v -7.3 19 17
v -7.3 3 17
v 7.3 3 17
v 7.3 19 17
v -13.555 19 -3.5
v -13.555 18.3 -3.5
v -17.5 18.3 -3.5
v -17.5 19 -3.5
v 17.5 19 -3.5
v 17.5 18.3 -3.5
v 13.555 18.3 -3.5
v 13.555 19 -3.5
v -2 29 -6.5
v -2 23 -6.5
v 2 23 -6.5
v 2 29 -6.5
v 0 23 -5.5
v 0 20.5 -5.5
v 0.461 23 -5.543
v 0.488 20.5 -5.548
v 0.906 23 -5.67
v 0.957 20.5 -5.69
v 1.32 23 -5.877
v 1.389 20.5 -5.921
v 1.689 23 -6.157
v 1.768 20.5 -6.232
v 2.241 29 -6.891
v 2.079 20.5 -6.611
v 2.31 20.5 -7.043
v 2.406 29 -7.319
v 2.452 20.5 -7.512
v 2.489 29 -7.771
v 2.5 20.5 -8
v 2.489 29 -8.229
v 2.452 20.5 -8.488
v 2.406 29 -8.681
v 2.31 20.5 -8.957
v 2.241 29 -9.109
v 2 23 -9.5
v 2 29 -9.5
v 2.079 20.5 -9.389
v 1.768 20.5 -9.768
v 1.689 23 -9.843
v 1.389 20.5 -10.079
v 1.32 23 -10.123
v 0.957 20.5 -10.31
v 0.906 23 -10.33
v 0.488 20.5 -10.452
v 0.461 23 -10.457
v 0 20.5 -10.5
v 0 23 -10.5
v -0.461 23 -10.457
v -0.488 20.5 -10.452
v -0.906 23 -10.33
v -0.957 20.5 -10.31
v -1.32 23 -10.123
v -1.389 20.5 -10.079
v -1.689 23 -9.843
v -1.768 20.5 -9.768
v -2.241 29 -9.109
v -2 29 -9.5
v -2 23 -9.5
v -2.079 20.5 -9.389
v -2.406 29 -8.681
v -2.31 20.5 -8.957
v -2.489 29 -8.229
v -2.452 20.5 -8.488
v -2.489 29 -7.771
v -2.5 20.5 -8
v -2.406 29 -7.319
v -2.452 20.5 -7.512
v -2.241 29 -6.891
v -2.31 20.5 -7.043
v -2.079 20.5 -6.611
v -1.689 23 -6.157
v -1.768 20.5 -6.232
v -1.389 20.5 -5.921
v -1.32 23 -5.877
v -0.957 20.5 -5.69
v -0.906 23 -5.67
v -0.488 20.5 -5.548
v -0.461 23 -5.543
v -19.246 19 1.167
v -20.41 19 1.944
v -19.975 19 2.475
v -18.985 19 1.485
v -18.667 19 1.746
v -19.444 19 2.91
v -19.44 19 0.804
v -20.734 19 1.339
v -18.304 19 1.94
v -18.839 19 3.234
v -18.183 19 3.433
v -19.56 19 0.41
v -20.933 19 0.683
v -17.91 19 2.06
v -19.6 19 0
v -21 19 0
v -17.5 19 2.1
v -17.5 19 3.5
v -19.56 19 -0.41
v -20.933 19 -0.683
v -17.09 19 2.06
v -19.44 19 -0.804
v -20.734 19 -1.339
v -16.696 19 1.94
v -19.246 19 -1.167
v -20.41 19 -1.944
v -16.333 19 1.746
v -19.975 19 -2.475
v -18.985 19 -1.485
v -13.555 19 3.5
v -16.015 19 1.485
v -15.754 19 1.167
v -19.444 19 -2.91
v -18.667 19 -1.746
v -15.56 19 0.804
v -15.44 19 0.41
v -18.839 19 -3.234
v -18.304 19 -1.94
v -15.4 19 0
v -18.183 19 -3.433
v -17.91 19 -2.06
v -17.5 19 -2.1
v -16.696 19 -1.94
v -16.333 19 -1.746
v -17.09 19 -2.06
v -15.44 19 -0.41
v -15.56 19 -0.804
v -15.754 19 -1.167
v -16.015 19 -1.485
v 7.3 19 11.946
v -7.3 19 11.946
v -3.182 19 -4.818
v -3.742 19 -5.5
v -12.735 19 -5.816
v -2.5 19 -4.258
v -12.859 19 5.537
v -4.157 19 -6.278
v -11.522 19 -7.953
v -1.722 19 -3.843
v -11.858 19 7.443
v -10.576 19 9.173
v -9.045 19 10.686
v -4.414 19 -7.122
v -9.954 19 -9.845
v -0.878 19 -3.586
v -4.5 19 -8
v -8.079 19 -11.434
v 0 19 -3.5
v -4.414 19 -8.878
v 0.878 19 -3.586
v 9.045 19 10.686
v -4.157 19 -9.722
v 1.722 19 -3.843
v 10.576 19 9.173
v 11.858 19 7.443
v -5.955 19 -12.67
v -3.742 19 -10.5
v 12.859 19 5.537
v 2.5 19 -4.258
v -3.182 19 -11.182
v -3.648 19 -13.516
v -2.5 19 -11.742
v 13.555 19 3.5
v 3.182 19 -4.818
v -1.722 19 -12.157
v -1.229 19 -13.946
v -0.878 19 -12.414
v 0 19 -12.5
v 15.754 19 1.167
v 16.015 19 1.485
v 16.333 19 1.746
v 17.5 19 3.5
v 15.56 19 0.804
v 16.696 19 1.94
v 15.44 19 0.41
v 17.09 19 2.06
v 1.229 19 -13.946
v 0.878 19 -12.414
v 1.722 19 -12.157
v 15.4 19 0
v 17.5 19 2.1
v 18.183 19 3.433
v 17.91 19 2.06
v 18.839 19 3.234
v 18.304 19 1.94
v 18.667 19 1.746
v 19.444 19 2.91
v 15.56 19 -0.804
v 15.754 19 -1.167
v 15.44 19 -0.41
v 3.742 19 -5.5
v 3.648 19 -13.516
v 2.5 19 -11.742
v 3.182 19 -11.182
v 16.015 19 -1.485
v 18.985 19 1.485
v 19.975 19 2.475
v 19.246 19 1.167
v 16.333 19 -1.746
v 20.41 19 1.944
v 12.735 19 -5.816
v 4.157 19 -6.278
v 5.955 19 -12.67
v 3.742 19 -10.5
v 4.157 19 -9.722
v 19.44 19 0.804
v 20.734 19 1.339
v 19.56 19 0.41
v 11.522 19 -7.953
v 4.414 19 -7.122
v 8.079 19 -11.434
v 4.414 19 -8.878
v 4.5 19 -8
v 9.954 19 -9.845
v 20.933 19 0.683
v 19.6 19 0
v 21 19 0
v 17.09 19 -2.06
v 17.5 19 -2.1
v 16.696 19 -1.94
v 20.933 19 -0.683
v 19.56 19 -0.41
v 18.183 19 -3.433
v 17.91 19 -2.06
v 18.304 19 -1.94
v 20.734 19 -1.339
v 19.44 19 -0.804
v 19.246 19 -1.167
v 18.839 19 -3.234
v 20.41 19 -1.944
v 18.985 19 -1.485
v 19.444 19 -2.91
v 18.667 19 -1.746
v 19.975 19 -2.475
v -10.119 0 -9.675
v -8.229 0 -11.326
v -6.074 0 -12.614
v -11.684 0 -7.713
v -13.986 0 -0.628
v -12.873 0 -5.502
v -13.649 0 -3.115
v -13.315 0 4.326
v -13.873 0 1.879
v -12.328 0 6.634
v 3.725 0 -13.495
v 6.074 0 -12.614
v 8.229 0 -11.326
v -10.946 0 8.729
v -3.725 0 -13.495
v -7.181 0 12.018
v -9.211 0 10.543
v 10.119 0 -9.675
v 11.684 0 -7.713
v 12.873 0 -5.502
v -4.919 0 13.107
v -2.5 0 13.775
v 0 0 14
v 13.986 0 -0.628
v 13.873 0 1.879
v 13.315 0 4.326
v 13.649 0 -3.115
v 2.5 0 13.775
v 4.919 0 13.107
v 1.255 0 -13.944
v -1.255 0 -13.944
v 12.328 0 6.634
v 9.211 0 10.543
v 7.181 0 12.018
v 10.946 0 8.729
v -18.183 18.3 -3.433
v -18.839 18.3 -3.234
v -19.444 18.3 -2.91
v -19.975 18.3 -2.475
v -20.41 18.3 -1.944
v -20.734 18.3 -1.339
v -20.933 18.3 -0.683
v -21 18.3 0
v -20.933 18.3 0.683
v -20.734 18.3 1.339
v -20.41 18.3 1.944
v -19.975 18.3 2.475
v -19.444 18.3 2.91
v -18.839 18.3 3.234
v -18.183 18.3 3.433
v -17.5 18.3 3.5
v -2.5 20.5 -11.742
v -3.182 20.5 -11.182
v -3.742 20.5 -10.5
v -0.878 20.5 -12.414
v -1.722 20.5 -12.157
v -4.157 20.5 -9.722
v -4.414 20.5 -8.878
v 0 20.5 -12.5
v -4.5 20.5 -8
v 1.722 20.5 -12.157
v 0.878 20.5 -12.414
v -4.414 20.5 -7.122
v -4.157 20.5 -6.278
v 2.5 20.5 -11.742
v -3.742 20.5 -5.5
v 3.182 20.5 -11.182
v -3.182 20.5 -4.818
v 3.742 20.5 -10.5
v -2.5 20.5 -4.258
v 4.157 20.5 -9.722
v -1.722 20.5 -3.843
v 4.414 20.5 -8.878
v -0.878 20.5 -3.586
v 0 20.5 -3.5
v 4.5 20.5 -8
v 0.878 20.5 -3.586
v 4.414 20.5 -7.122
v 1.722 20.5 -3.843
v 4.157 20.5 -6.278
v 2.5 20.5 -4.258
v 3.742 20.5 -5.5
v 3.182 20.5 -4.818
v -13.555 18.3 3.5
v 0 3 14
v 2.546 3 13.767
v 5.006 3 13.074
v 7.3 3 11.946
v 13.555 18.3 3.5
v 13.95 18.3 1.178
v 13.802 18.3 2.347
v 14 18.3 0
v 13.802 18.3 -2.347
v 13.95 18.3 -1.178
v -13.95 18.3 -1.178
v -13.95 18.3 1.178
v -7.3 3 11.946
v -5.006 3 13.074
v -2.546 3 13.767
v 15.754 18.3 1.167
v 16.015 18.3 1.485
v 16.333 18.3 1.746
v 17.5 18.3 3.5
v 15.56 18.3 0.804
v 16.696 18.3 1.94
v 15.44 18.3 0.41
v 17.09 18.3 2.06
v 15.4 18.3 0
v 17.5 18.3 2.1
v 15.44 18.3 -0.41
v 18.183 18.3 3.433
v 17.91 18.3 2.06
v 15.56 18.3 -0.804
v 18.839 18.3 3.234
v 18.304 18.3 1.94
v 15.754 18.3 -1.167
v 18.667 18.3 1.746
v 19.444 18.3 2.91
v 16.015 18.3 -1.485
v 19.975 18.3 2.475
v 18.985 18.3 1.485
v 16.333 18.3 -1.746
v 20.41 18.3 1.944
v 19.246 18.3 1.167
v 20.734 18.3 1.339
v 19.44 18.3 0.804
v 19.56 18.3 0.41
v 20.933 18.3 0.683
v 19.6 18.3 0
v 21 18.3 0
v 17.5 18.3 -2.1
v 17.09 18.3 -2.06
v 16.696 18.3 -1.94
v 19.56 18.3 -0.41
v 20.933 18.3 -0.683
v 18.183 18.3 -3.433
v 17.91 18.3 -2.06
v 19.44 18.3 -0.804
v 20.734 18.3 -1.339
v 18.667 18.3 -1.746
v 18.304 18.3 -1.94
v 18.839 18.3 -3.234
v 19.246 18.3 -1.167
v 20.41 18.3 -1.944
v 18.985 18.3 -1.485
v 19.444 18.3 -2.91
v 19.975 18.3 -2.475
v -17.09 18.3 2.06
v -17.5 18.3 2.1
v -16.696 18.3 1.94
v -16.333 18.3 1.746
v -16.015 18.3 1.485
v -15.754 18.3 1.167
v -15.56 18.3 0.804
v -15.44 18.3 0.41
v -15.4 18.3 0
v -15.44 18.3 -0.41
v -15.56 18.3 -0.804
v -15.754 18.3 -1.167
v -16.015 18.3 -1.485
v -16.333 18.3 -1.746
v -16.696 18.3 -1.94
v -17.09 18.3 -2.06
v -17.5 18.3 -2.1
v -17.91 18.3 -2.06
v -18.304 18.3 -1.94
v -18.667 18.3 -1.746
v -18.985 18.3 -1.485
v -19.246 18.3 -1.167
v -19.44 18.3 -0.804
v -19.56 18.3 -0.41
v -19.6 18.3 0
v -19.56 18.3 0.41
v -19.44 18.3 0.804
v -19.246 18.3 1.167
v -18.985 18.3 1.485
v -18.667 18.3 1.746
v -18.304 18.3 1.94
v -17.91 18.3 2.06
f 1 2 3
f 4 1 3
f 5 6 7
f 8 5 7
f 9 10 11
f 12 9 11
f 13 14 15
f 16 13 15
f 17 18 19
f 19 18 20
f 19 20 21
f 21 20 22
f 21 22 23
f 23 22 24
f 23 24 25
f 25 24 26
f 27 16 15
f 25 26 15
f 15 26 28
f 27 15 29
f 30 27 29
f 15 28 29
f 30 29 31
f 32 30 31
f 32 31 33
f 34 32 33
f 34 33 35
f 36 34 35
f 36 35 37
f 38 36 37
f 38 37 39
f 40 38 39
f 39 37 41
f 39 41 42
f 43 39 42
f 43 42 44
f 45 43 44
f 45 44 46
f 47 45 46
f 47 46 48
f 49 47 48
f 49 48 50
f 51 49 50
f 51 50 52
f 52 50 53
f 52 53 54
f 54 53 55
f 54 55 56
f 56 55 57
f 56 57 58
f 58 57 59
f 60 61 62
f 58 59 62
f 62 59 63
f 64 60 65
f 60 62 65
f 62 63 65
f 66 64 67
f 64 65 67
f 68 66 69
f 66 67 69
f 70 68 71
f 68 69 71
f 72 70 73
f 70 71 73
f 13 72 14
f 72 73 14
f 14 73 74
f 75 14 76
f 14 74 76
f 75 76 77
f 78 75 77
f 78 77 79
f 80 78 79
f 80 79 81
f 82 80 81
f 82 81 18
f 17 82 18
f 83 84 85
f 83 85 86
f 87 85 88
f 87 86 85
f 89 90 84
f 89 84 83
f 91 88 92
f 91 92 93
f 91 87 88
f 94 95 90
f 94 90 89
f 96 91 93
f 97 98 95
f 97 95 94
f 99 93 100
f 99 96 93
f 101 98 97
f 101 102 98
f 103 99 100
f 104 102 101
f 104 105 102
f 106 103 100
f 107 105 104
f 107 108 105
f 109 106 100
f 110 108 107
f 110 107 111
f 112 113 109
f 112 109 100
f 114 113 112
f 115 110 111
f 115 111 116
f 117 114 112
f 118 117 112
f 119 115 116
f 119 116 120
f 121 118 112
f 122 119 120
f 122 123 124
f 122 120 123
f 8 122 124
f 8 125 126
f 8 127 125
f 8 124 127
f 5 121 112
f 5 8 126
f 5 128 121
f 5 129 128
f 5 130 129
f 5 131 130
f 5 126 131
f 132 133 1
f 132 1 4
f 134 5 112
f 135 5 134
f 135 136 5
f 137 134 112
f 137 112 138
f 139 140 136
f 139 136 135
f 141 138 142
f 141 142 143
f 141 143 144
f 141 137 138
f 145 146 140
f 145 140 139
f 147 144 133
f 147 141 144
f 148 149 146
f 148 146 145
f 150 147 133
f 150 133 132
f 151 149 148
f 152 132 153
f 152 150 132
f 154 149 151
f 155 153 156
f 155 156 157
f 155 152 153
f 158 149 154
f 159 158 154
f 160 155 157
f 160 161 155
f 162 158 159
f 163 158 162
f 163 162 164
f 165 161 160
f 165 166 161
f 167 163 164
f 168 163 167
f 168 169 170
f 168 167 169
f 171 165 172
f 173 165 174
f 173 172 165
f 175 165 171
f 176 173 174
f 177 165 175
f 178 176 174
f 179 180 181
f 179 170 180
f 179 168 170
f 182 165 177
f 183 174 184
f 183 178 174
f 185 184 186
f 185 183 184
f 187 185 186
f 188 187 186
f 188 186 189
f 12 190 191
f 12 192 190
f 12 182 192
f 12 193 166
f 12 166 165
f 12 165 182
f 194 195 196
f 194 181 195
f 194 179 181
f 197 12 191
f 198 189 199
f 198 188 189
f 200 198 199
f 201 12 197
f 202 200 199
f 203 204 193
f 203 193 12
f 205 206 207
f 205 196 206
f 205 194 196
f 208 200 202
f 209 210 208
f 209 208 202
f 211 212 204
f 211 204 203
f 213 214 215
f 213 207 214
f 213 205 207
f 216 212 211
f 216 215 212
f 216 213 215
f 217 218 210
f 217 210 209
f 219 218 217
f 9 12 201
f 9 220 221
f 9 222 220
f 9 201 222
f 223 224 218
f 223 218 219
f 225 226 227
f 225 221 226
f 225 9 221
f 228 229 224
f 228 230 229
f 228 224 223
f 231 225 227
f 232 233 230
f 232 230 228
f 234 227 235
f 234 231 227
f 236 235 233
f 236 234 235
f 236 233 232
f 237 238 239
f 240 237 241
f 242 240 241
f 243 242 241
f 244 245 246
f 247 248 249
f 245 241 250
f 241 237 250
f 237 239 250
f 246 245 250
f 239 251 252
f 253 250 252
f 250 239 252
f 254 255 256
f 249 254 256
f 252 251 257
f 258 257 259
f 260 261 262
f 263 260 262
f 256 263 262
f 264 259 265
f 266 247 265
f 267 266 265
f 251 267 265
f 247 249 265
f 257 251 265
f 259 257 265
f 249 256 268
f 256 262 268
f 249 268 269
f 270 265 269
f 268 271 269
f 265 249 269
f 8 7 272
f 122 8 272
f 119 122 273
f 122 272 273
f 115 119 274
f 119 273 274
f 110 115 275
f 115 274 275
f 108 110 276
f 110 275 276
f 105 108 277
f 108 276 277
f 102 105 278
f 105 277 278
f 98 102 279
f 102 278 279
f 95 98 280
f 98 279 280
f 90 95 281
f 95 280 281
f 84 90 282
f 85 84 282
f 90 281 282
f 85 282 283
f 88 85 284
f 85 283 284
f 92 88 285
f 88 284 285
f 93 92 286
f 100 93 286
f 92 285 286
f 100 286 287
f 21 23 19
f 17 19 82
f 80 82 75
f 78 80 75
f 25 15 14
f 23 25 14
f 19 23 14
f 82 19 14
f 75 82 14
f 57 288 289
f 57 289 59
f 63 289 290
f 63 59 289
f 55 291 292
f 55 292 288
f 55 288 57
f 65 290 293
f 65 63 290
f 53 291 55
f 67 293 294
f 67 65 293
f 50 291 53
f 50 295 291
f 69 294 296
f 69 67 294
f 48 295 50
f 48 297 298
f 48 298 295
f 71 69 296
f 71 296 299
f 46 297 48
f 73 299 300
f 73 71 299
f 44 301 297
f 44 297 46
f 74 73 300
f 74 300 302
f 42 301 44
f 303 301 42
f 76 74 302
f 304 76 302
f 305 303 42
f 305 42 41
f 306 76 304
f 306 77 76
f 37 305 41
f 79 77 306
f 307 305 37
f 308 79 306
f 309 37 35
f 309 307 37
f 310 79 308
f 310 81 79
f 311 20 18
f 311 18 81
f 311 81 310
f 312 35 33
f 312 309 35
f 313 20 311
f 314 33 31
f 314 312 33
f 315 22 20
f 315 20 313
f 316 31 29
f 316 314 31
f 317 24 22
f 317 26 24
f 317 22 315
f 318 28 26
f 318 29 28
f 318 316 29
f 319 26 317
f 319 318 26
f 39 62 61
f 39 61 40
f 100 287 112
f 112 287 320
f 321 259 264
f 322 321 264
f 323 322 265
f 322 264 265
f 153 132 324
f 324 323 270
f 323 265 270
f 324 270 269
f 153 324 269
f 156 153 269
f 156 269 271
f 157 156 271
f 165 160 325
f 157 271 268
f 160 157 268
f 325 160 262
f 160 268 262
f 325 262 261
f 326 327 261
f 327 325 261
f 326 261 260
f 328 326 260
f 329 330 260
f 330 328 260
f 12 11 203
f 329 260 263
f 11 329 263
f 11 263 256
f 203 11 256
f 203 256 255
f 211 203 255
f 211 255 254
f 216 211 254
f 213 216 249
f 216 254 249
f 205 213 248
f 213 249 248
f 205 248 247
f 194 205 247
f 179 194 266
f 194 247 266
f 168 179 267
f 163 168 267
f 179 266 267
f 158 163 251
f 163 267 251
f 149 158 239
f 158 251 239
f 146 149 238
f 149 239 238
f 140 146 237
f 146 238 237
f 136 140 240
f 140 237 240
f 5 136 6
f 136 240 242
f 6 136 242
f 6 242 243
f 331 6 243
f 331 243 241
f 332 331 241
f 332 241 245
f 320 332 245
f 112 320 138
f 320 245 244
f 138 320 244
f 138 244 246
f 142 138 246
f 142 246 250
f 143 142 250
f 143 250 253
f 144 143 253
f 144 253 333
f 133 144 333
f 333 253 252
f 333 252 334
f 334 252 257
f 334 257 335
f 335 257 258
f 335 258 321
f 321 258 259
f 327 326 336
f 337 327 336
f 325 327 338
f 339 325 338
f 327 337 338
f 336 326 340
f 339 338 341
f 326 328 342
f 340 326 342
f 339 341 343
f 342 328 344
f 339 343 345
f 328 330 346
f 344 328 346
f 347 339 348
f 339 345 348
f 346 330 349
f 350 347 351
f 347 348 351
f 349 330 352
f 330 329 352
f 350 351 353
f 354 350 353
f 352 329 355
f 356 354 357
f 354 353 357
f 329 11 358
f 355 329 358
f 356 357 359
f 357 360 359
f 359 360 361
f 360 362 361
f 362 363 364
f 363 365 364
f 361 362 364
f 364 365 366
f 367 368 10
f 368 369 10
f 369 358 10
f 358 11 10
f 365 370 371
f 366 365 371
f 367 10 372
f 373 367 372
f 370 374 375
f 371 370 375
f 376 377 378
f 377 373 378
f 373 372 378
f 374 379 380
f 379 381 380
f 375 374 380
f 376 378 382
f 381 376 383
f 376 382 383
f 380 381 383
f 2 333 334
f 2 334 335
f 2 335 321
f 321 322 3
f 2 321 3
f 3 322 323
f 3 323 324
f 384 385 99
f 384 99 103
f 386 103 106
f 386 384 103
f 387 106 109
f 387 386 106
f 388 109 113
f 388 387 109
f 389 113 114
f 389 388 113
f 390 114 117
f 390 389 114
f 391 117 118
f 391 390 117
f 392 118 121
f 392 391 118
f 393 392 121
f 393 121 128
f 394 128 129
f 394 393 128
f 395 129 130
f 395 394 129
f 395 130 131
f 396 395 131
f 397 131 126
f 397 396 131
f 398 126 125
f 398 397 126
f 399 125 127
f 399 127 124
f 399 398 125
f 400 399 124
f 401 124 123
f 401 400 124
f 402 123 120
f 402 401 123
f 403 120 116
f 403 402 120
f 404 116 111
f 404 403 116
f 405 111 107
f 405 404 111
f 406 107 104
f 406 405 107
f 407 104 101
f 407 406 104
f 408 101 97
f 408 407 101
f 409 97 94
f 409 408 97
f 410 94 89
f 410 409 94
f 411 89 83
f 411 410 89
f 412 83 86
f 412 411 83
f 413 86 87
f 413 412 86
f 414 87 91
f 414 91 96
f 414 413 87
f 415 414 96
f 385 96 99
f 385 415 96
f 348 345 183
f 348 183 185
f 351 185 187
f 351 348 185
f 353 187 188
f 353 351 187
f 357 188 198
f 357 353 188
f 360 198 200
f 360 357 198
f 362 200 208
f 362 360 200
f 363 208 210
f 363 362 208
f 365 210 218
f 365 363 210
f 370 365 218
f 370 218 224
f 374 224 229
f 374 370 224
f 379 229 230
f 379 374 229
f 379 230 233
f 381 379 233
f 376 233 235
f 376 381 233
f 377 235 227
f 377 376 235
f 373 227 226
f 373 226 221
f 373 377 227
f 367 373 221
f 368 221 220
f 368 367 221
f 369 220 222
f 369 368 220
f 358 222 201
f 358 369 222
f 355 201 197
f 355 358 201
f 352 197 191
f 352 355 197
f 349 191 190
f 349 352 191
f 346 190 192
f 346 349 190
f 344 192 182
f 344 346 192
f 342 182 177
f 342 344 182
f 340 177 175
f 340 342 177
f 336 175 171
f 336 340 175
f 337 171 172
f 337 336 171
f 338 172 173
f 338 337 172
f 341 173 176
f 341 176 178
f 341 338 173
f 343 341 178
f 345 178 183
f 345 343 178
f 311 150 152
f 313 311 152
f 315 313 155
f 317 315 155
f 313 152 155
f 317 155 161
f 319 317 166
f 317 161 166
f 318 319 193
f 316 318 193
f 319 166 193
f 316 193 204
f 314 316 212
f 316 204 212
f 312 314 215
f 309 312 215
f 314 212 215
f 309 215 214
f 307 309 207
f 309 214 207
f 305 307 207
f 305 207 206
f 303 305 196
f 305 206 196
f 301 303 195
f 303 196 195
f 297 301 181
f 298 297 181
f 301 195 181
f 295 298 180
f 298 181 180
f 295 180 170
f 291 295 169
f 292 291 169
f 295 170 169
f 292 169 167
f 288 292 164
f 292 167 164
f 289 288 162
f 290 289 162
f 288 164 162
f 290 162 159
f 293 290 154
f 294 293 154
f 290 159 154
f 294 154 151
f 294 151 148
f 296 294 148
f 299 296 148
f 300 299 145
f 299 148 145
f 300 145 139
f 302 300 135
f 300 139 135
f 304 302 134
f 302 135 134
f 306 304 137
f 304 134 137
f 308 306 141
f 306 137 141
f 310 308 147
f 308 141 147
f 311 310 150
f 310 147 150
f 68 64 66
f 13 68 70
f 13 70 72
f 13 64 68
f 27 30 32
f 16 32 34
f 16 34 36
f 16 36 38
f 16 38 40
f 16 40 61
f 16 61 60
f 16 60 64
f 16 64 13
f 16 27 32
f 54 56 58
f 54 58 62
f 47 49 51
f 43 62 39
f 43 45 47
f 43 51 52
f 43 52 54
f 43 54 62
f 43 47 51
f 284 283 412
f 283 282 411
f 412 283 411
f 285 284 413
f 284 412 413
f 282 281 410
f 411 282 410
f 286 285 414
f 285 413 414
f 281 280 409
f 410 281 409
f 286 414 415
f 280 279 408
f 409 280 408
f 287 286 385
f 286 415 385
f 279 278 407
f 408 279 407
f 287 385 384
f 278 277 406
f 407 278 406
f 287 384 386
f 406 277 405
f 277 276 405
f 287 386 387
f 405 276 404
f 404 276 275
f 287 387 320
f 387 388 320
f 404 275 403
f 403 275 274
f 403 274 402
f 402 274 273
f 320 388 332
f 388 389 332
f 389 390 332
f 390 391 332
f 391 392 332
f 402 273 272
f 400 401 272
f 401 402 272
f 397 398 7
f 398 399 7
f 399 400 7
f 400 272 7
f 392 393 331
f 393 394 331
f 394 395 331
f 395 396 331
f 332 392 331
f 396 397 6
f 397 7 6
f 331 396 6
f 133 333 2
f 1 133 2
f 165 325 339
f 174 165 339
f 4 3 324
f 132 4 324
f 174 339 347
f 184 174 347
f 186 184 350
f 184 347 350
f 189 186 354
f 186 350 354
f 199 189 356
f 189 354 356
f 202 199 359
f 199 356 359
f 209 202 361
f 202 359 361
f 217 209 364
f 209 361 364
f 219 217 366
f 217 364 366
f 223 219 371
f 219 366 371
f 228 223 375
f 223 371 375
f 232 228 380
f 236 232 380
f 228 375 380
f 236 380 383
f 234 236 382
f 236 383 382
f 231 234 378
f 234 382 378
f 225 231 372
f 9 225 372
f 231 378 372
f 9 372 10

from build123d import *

# Parameters (mm, degrees)
SKETCH1_R           = 14
BOSS_EXTRUDE2_DEPTH = 19
BOSS_EXTRUDE4_START = -0.7
SKETCH2_R           = 2.1
BOSS_EXTRUDE4_DEPTH = 0.7
BOSS_EXTRUDE5_START = -16
BOSS_EXTRUDE5_DEPTH = 16
SKETCH4_R           = 4.5
BOSS_EXTRUDE6_DEPTH = 1.5
SKETCH5_R           = 2.5
BOSS_EXTRUDE7_DEPTH = 8.5
CUT_EXTRUDE1_START  = -6
CUT_EXTRUDE1_DEPTH  = 6


with BuildPart() as part:
    # Sketch1 → Boss-Extrude2 (new body)
    with BuildSketch(Plane(origin=(0, 0, 0), x_dir=(1, 0, 0), z_dir=(0, 1, 0))):
        with Locations(Location((0, 0, 0), (0, 0, 270))):
            Circle(SKETCH1_R)
    extrude(amount=BOSS_EXTRUDE2_DEPTH)

    # Sketch2 → Boss-Extrude4 (add)
    # profile 1 of 2: a face of its own
    with BuildSketch(Plane(origin=(0, 19, 0), x_dir=(1, 0, 0), z_dir=(0, 1, 0)).offset(BOSS_EXTRUDE4_START)):
        with BuildLine():
            Line((17.5, 3.5), (13.555441712, 3.5))
            ThreePointArc((13.555441712, 3.5), (13.888415748, 1.764060095), (14, 0))
            ThreePointArc((14, 0), (13.888415748, -1.764060095), (13.555441712, -3.5))
            Line((13.555441712, -3.5), (17.5, -3.5))
            ThreePointArc((17.5, -3.5), (21, 0), (17.5, 3.5))
        make_face()
        with Locations(Location((17.5, 0, 0), (0, 0, 270))):
            Circle(SKETCH2_R, mode=Mode.SUBTRACT)
    # profile 2 of 2: a face of its own
    with BuildSketch(Plane(origin=(0, 19, 0), x_dir=(1, 0, 0), z_dir=(0, 1, 0)).offset(BOSS_EXTRUDE4_START)):
        with BuildLine():
            Line((-13.555441712, 3.5), (-17.5, 3.5))
            ThreePointArc((-17.5, 3.5), (-21, 0), (-17.5, -3.5))
            Line((-17.5, -3.5), (-13.555441712, -3.5))
            ThreePointArc((-13.555441712, -3.5), (-14, 0), (-13.555441712, 3.5))
        make_face()
        with Locations(Location((-17.5, 0, 0), (0, 0, 270))):
            Circle(SKETCH2_R, mode=Mode.SUBTRACT)
    extrude(amount=BOSS_EXTRUDE4_DEPTH)

    # Sketch3 → Boss-Extrude5 (add)
    with BuildSketch(Plane(origin=(0, 19, 0), x_dir=(1, 0, 0), z_dir=(0, 1, 0)).offset(BOSS_EXTRUDE5_START)):
        with BuildLine():
            Line((-7.3, -11.94612908), (-7.3, -17))
            Line((-7.3, -17), (7.3, -17))
            Line((7.3, -17), (7.3, -11.94612908))
            ThreePointArc((7.3, -11.94612908), (0, -14), (-7.3, -11.94612908))
        make_face()
    extrude(amount=BOSS_EXTRUDE5_DEPTH)

    # Sketch4 → Boss-Extrude6 (add)
    with BuildSketch(Plane(origin=(0, 19, 0), x_dir=(1, 0, 0), z_dir=(0, 1, 0))):
        with Locations(Location((0, 8, 0), (0, 0, 270))):
            Circle(SKETCH4_R)
    extrude(amount=BOSS_EXTRUDE6_DEPTH)

    # Sketch5 → Boss-Extrude7 (add)
    with BuildSketch(Plane(origin=(0, 20.5, 0), x_dir=(1, 0, 0), z_dir=(0, 1, 0))):
        with Locations(Location((0, 8, 0), (0, 0, 270))):
            Circle(SKETCH5_R)
    extrude(amount=BOSS_EXTRUDE7_DEPTH)

    # Sketch7 → Cut-Extrude1 (cut)
    with BuildSketch(Plane(origin=(0, 29, 0), x_dir=(1, 0, 0), z_dir=(0, 1, 0)).offset(CUT_EXTRUDE1_START)):
        with BuildLine():
            Line((-2, 9.5), (2, 9.5))
            ThreePointArc((2, 9.5), (0, 10.5), (-2, 9.5))
        make_face()
        with BuildLine():
            Line((-2, 6.5), (2, 6.5))
            ThreePointArc((2, 6.5), (0, 5.5), (-2, 6.5))
        make_face()
    extrude(amount=CUT_EXTRUDE1_DEPTH, mode=Mode.SUBTRACT)


solid = part.part
